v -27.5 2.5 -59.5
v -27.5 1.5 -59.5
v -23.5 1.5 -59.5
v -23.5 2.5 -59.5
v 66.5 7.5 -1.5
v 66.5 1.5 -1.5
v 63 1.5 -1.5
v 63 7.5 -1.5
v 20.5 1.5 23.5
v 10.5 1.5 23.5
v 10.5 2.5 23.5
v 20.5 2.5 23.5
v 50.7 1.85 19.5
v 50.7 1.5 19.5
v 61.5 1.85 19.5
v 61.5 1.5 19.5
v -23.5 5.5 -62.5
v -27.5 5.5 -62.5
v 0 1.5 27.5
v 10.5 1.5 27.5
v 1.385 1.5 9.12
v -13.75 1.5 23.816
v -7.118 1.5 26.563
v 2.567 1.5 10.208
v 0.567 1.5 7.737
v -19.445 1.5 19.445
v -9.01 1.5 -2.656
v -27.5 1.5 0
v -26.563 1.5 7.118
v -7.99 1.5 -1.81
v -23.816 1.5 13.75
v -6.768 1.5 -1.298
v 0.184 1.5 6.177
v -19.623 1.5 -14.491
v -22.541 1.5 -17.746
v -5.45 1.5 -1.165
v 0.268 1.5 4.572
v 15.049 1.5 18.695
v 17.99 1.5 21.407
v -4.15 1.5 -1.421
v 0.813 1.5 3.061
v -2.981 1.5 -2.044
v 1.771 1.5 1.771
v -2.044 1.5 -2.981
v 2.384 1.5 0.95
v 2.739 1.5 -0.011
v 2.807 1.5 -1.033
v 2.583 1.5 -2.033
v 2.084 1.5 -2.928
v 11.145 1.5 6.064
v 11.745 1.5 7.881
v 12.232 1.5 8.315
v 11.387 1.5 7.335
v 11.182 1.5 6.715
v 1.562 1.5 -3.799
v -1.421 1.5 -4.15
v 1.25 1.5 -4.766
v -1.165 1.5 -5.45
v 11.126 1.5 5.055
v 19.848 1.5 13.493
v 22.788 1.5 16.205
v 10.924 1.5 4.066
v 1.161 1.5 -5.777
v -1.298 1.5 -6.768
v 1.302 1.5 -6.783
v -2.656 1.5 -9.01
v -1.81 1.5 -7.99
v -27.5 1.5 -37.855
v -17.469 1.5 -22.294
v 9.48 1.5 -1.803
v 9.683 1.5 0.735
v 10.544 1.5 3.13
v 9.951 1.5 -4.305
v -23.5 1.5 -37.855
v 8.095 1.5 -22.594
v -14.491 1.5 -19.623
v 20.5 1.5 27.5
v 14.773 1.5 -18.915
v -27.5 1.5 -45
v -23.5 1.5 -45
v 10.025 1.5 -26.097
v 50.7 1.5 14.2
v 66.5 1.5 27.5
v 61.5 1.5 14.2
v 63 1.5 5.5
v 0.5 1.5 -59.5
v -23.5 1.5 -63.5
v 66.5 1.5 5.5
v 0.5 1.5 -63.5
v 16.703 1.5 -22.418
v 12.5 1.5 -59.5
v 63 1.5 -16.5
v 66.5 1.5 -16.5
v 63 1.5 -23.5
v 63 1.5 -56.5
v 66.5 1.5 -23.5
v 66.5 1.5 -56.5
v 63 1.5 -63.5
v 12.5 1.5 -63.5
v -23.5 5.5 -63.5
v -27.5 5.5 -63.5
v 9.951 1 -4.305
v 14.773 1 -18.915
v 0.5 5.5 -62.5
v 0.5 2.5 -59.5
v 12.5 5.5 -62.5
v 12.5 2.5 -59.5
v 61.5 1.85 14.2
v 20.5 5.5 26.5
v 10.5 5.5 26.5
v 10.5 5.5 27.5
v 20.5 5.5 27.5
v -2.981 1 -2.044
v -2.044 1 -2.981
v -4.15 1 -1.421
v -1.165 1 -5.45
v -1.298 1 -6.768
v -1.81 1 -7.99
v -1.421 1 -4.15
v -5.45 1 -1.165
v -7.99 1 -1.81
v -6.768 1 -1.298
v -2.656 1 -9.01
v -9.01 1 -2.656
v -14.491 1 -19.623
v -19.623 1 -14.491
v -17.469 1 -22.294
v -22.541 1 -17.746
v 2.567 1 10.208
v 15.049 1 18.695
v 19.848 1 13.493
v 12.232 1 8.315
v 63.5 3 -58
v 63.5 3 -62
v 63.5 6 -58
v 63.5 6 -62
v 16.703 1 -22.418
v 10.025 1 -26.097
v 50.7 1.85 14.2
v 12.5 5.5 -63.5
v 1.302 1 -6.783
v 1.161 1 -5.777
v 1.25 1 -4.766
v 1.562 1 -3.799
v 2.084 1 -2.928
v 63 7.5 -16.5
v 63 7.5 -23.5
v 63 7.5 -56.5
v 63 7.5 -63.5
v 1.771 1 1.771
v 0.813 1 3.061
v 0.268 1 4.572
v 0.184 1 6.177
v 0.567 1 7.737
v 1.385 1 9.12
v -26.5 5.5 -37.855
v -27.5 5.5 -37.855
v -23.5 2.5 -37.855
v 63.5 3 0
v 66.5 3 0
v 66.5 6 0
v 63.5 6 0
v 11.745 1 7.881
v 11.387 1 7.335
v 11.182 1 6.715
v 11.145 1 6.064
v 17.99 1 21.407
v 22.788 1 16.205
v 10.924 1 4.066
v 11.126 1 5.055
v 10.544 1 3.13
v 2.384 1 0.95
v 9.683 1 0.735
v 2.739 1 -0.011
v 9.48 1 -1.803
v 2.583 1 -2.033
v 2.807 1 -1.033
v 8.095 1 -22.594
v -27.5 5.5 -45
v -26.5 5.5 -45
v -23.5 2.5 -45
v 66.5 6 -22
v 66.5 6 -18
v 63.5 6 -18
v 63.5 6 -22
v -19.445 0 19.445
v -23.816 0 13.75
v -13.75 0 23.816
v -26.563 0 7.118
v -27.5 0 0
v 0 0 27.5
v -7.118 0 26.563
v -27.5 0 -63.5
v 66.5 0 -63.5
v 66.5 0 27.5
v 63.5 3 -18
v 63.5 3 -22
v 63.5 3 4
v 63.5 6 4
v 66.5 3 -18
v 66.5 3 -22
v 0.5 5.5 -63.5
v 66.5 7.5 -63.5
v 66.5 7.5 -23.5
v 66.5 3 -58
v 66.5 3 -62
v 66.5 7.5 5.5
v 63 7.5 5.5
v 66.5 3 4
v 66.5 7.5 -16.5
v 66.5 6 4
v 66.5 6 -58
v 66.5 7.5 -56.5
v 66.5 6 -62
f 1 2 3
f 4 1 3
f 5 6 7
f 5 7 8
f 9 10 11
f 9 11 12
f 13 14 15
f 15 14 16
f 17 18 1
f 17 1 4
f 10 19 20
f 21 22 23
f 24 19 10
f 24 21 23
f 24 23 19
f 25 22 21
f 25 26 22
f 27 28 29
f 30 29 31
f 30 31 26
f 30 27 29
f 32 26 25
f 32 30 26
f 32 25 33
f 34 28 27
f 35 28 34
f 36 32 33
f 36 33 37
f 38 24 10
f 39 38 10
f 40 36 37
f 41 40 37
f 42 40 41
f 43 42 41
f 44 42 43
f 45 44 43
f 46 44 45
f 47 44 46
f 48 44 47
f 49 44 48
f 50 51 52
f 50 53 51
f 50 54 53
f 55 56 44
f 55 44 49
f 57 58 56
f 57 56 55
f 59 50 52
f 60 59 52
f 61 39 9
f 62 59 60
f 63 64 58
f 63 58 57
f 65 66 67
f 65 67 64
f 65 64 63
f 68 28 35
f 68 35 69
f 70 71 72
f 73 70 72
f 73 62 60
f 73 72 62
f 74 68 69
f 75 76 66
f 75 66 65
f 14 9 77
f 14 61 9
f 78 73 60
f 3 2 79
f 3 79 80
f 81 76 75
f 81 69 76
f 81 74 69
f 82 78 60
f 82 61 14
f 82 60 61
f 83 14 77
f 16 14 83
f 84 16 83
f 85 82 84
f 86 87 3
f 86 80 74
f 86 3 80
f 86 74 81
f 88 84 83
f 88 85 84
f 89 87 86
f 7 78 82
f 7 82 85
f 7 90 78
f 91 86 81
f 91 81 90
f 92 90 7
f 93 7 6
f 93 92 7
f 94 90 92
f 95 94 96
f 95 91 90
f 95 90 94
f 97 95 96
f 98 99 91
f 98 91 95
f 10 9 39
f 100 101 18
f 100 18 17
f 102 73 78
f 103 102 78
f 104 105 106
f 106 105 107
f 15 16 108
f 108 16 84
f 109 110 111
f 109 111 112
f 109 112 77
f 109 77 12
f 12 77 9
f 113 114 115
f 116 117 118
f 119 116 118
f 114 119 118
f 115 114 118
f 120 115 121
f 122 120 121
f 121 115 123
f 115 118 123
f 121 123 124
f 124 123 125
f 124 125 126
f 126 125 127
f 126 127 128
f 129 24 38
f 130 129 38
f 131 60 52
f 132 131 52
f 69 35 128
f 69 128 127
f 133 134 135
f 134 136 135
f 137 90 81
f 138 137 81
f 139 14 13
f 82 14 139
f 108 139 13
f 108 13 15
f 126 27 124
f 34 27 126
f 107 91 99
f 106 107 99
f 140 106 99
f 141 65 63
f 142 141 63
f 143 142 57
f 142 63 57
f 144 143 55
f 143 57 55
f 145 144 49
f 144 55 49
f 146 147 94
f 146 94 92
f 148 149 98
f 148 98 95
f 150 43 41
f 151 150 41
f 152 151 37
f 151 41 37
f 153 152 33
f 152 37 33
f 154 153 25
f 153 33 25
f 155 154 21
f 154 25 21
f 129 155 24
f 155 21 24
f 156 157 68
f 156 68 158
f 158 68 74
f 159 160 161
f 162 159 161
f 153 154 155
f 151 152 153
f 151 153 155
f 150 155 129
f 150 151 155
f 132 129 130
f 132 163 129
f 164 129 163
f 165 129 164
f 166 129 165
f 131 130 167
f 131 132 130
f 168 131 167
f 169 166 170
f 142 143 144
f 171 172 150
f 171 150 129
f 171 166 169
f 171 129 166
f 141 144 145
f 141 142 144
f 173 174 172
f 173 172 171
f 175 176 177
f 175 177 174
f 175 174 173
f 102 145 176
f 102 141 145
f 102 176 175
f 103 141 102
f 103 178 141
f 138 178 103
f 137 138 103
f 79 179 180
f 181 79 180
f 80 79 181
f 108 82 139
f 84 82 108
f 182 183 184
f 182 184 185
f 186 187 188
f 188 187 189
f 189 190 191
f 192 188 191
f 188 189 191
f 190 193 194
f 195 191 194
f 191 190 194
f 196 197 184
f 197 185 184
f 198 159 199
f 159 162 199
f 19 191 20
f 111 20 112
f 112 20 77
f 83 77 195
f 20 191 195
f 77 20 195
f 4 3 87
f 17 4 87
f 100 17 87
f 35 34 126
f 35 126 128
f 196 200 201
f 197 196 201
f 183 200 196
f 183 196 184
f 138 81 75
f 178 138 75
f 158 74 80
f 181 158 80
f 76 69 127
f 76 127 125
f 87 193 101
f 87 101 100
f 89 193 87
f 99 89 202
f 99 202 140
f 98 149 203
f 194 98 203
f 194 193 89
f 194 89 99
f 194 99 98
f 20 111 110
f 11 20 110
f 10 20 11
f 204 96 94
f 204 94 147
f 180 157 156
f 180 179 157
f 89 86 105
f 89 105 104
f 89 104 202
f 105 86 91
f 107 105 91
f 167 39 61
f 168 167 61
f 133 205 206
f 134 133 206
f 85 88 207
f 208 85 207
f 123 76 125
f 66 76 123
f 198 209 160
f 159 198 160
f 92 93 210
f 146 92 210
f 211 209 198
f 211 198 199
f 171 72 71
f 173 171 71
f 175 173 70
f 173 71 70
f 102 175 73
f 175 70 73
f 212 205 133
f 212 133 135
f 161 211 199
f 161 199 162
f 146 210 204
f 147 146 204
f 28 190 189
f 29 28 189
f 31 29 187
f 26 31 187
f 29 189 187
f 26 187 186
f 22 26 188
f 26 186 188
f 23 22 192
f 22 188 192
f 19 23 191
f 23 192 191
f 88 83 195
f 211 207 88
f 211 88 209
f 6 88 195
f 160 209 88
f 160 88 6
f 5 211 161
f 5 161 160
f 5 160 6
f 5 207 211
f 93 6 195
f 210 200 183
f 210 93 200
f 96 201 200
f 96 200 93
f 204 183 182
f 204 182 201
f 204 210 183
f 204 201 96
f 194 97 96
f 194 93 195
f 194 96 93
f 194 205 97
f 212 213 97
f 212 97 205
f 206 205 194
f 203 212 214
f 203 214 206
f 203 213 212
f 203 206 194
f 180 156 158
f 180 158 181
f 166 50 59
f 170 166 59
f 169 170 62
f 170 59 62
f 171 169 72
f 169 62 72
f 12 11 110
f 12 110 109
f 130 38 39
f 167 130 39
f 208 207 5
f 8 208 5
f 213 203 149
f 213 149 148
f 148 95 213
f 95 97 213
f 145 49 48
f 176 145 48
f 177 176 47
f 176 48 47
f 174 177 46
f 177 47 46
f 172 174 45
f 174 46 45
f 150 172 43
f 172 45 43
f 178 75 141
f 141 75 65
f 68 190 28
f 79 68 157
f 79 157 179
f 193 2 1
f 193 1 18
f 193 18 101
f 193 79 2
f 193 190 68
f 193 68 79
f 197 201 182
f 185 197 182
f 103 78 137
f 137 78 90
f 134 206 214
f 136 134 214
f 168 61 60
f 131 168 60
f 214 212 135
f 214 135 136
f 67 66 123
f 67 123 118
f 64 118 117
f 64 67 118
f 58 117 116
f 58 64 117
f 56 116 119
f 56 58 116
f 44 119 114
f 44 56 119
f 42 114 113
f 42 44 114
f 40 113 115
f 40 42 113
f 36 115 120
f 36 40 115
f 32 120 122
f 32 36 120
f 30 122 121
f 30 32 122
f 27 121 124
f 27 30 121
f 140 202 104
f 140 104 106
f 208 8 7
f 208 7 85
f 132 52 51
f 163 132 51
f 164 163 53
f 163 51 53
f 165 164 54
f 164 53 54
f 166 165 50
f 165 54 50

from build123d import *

# Parameters (mm, degrees)
EXTRUDE_1_DEPTH     = 1.5
SKETCH_3_W          = 7
SKETCH_3_H          = 6
SKETCH_3_W_2        = 4
SKETCH_3_H_2        = 3
EXTRUDE_3_DEPTH     = 3
SKETCH_4_W          = 7
SKETCH_4_H          = 6
EXTRUDE_4_DEPTH     = 0.5
SKETCH_5_W          = 4
SKETCH_5_H          = 4
SKETCH_5_W_2        = 12
SKETCH_5_H_2        = 7.145089785
SKETCH_5_W_3        = 10
EXTRUDE_5_DEPTH     = 4
CHAMFER_1_SIZE      = 3
CUT_EXTRUDE_2_DEPTH = 0.5
SKETCH_8_W          = 10.8
SKETCH_8_H          = 5.3
EXTRUDE_6_DEPTH     = 1.85


with BuildPart() as part:
    # Эскиз1 → Бобышка-Вытянуть1 (new body)
    with BuildSketch(Plane(origin=(0, 0, 0), x_dir=(1, 0, 0), z_dir=(0, 1, 0))):
        with BuildLine():
            Line((-27.5, 63.5), (-27.5, 0))
            ThreePointArc((-27.5, 0), (-19.445436483, -19.445436483), (0, -27.5))
            Line((0, -27.5), (66.5, -27.5))
            Line((66.5, -27.5), (66.5, 63.5))
            Line((66.5, 63.5), (-27.5, 63.5))
        make_face()
    extrude(amount=EXTRUDE_1_DEPTH)

    # Эскиз3 → Бобышка-Вытянуть3 (add)
    # profile 1 of 3: a face of its own
    with BuildSketch(Plane(origin=(66.5, 0, 0), x_dir=(0, 0, -1), z_dir=(1, 0, 0))):
        with Locations((-2, 4.5)):
            Rectangle(SKETCH_3_W, SKETCH_3_H)
        with Locations((-2, 4.5)):
            Rectangle(SKETCH_3_W_2, SKETCH_3_H_2, mode=Mode.SUBTRACT)
    # profile 2 of 3: a face of its own
    with BuildSketch(Plane(origin=(66.5, 0, 0), x_dir=(0, 0, -1), z_dir=(1, 0, 0))):
        with Locations((60, 4.5)):
            Rectangle(SKETCH_3_W, SKETCH_3_H)
        with Locations((60, 4.5)):
            Rectangle(SKETCH_3_W_2, SKETCH_3_H_2, mode=Mode.SUBTRACT)
    # profile 3 of 3: a face of its own
    with BuildSketch(Plane(origin=(66.5, 0, 0), x_dir=(0, 0, -1), z_dir=(1, 0, 0))):
        with Locations((20, 4.5)):
            Rectangle(SKETCH_3_W, SKETCH_3_H)
        with Locations((20, 4.5)):
            Rectangle(SKETCH_3_W_2, SKETCH_3_H_2, mode=Mode.SUBTRACT)
    extrude(amount=-EXTRUDE_3_DEPTH)

    # Эскиз4 → Бобышка-Вытянуть4 (add)
    with BuildSketch(Plane.ZY.offset(-63.5)):
        with Locations((-60, 4.5)):
            Rectangle(SKETCH_4_W, SKETCH_4_H)
        with Locations((-20, 4.5)):
            Rectangle(SKETCH_4_W, SKETCH_4_H)
        with Locations((2, 4.5)):
            Rectangle(SKETCH_4_W, SKETCH_4_H)
    extrude(amount=EXTRUDE_4_DEPTH)

    # Эскиз5 → Бобышка-Вытянуть5 (add)
    with BuildSketch(Plane(origin=(0, 1.5, 0), x_dir=(1, 0, 0), z_dir=(0, 1, 0))):
        with Locations((-25.5, 61.5)):
            Rectangle(SKETCH_5_W, SKETCH_5_H)
        with Locations((6.5, 61.5)):
            Rectangle(SKETCH_5_W_2, SKETCH_5_H)
        with Locations((-25.5, 41.427455108)):
            Rectangle(SKETCH_5_W, SKETCH_5_H_2)
        with Locations((15.5, -25.5)):
            Rectangle(SKETCH_5_W_3, SKETCH_5_H)
    extrude(amount=EXTRUDE_5_DEPTH)

    # Фаска1
    chamfer_1_edges = [part.edges().sort_by_distance(p)[0] for p in [
        (6.5, 5.5, -59.5),
        (-25.5, 5.5, -59.5),
        (-23.5, 5.5, -41.427455107),
        (15.5, 5.5, 23.5),
    ]]
    chamfer(chamfer_1_edges, length=CHAMFER_1_SIZE)

    # Эскиз7 → Вырез-Вытянуть2 (cut)
    with BuildSketch(Plane(origin=(0, 1.5, 0), x_dir=(1, 0, 0), z_dir=(0, 1, 0))):
        with BuildLine():
            Line((-19.62312526, 14.49129531), (-22.541249894, 17.745613481))
            Line((-22.541249894, 17.745613481), (-17.469363806, 22.293538718))
            Line((-17.469363806, 22.293538718), (-14.49129531, 19.62312526))
            Line((-14.49129531, 19.62312526), (-2.655568985, 9.010111183))
            ThreePointArc((-2.655568985, 9.010111183), (-2.47780361, 2.47780361), (-9.010111183, 2.655568985))
            Line((-9.010111183, 2.655568985), (-19.62312526, 14.49129531))
        make_face()
        with BuildLine():
            Line((9.950995869, 4.304852328), (14.772590148, 18.914824353))
            Line((14.772590148, 18.914824353), (16.702744877, 22.418322994))
            Line((16.702744877, 22.418322994), (10.02542163, 26.097007748))
            Line((10.02542163, 26.097007748), (8.095266902, 22.593509107))
            Line((8.095266902, 22.593509107), (1.302167241, 6.782804644))
            ThreePointArc((1.302167241, 6.782804644), (1.249533327, 4.765531423), (2.083776147, 2.928087411))
            ThreePointArc((2.083776147, 2.928087411), (2.810034737, 0.519874571), (1.770696829, -1.770696829))
            ThreePointArc((1.770696829, -1.770696829), (0.184130493, -6.176714777), (2.567220604, -10.207976169))
            Line((2.567220604, -10.207976169), (15.04943055, -18.695310645))
            Line((15.04943055, -18.695310645), (17.989670533, -21.407318912))
            Line((17.989670533, -21.407318912), (22.788067369, -16.205108284))
            Line((22.788067369, -16.205108284), (19.847827385, -13.493100017))
            Line((19.847827385, -13.493100017), (12.232446688, -8.314987854))
            ThreePointArc((12.232446688, -8.314987854), (11.3870962, -7.335158785), (11.144915737, -6.063926675))
            ThreePointArc((11.144915737, -6.063926675), (11.047783222, -4.555489901), (10.543689128, -3.130461702))
            ThreePointArc((10.543689128, -3.130461702), (9.497003398, 0.527383324), (9.950995869, 4.304852328))
        make_face()
    extrude(amount=-CUT_EXTRUDE_2_DEPTH, mode=Mode.SUBTRACT)

    # Эскиз8 → Бобышка-Вытянуть6 (add)
    with BuildSketch(Plane(origin=(0, 0, 0), x_dir=(1, 0, 0), z_dir=(0, 1, 0))):
        with Locations((56.1, -16.85)):
            Rectangle(SKETCH_8_W, SKETCH_8_H)
    extrude(amount=EXTRUDE_6_DEPTH)


solid = part.part
